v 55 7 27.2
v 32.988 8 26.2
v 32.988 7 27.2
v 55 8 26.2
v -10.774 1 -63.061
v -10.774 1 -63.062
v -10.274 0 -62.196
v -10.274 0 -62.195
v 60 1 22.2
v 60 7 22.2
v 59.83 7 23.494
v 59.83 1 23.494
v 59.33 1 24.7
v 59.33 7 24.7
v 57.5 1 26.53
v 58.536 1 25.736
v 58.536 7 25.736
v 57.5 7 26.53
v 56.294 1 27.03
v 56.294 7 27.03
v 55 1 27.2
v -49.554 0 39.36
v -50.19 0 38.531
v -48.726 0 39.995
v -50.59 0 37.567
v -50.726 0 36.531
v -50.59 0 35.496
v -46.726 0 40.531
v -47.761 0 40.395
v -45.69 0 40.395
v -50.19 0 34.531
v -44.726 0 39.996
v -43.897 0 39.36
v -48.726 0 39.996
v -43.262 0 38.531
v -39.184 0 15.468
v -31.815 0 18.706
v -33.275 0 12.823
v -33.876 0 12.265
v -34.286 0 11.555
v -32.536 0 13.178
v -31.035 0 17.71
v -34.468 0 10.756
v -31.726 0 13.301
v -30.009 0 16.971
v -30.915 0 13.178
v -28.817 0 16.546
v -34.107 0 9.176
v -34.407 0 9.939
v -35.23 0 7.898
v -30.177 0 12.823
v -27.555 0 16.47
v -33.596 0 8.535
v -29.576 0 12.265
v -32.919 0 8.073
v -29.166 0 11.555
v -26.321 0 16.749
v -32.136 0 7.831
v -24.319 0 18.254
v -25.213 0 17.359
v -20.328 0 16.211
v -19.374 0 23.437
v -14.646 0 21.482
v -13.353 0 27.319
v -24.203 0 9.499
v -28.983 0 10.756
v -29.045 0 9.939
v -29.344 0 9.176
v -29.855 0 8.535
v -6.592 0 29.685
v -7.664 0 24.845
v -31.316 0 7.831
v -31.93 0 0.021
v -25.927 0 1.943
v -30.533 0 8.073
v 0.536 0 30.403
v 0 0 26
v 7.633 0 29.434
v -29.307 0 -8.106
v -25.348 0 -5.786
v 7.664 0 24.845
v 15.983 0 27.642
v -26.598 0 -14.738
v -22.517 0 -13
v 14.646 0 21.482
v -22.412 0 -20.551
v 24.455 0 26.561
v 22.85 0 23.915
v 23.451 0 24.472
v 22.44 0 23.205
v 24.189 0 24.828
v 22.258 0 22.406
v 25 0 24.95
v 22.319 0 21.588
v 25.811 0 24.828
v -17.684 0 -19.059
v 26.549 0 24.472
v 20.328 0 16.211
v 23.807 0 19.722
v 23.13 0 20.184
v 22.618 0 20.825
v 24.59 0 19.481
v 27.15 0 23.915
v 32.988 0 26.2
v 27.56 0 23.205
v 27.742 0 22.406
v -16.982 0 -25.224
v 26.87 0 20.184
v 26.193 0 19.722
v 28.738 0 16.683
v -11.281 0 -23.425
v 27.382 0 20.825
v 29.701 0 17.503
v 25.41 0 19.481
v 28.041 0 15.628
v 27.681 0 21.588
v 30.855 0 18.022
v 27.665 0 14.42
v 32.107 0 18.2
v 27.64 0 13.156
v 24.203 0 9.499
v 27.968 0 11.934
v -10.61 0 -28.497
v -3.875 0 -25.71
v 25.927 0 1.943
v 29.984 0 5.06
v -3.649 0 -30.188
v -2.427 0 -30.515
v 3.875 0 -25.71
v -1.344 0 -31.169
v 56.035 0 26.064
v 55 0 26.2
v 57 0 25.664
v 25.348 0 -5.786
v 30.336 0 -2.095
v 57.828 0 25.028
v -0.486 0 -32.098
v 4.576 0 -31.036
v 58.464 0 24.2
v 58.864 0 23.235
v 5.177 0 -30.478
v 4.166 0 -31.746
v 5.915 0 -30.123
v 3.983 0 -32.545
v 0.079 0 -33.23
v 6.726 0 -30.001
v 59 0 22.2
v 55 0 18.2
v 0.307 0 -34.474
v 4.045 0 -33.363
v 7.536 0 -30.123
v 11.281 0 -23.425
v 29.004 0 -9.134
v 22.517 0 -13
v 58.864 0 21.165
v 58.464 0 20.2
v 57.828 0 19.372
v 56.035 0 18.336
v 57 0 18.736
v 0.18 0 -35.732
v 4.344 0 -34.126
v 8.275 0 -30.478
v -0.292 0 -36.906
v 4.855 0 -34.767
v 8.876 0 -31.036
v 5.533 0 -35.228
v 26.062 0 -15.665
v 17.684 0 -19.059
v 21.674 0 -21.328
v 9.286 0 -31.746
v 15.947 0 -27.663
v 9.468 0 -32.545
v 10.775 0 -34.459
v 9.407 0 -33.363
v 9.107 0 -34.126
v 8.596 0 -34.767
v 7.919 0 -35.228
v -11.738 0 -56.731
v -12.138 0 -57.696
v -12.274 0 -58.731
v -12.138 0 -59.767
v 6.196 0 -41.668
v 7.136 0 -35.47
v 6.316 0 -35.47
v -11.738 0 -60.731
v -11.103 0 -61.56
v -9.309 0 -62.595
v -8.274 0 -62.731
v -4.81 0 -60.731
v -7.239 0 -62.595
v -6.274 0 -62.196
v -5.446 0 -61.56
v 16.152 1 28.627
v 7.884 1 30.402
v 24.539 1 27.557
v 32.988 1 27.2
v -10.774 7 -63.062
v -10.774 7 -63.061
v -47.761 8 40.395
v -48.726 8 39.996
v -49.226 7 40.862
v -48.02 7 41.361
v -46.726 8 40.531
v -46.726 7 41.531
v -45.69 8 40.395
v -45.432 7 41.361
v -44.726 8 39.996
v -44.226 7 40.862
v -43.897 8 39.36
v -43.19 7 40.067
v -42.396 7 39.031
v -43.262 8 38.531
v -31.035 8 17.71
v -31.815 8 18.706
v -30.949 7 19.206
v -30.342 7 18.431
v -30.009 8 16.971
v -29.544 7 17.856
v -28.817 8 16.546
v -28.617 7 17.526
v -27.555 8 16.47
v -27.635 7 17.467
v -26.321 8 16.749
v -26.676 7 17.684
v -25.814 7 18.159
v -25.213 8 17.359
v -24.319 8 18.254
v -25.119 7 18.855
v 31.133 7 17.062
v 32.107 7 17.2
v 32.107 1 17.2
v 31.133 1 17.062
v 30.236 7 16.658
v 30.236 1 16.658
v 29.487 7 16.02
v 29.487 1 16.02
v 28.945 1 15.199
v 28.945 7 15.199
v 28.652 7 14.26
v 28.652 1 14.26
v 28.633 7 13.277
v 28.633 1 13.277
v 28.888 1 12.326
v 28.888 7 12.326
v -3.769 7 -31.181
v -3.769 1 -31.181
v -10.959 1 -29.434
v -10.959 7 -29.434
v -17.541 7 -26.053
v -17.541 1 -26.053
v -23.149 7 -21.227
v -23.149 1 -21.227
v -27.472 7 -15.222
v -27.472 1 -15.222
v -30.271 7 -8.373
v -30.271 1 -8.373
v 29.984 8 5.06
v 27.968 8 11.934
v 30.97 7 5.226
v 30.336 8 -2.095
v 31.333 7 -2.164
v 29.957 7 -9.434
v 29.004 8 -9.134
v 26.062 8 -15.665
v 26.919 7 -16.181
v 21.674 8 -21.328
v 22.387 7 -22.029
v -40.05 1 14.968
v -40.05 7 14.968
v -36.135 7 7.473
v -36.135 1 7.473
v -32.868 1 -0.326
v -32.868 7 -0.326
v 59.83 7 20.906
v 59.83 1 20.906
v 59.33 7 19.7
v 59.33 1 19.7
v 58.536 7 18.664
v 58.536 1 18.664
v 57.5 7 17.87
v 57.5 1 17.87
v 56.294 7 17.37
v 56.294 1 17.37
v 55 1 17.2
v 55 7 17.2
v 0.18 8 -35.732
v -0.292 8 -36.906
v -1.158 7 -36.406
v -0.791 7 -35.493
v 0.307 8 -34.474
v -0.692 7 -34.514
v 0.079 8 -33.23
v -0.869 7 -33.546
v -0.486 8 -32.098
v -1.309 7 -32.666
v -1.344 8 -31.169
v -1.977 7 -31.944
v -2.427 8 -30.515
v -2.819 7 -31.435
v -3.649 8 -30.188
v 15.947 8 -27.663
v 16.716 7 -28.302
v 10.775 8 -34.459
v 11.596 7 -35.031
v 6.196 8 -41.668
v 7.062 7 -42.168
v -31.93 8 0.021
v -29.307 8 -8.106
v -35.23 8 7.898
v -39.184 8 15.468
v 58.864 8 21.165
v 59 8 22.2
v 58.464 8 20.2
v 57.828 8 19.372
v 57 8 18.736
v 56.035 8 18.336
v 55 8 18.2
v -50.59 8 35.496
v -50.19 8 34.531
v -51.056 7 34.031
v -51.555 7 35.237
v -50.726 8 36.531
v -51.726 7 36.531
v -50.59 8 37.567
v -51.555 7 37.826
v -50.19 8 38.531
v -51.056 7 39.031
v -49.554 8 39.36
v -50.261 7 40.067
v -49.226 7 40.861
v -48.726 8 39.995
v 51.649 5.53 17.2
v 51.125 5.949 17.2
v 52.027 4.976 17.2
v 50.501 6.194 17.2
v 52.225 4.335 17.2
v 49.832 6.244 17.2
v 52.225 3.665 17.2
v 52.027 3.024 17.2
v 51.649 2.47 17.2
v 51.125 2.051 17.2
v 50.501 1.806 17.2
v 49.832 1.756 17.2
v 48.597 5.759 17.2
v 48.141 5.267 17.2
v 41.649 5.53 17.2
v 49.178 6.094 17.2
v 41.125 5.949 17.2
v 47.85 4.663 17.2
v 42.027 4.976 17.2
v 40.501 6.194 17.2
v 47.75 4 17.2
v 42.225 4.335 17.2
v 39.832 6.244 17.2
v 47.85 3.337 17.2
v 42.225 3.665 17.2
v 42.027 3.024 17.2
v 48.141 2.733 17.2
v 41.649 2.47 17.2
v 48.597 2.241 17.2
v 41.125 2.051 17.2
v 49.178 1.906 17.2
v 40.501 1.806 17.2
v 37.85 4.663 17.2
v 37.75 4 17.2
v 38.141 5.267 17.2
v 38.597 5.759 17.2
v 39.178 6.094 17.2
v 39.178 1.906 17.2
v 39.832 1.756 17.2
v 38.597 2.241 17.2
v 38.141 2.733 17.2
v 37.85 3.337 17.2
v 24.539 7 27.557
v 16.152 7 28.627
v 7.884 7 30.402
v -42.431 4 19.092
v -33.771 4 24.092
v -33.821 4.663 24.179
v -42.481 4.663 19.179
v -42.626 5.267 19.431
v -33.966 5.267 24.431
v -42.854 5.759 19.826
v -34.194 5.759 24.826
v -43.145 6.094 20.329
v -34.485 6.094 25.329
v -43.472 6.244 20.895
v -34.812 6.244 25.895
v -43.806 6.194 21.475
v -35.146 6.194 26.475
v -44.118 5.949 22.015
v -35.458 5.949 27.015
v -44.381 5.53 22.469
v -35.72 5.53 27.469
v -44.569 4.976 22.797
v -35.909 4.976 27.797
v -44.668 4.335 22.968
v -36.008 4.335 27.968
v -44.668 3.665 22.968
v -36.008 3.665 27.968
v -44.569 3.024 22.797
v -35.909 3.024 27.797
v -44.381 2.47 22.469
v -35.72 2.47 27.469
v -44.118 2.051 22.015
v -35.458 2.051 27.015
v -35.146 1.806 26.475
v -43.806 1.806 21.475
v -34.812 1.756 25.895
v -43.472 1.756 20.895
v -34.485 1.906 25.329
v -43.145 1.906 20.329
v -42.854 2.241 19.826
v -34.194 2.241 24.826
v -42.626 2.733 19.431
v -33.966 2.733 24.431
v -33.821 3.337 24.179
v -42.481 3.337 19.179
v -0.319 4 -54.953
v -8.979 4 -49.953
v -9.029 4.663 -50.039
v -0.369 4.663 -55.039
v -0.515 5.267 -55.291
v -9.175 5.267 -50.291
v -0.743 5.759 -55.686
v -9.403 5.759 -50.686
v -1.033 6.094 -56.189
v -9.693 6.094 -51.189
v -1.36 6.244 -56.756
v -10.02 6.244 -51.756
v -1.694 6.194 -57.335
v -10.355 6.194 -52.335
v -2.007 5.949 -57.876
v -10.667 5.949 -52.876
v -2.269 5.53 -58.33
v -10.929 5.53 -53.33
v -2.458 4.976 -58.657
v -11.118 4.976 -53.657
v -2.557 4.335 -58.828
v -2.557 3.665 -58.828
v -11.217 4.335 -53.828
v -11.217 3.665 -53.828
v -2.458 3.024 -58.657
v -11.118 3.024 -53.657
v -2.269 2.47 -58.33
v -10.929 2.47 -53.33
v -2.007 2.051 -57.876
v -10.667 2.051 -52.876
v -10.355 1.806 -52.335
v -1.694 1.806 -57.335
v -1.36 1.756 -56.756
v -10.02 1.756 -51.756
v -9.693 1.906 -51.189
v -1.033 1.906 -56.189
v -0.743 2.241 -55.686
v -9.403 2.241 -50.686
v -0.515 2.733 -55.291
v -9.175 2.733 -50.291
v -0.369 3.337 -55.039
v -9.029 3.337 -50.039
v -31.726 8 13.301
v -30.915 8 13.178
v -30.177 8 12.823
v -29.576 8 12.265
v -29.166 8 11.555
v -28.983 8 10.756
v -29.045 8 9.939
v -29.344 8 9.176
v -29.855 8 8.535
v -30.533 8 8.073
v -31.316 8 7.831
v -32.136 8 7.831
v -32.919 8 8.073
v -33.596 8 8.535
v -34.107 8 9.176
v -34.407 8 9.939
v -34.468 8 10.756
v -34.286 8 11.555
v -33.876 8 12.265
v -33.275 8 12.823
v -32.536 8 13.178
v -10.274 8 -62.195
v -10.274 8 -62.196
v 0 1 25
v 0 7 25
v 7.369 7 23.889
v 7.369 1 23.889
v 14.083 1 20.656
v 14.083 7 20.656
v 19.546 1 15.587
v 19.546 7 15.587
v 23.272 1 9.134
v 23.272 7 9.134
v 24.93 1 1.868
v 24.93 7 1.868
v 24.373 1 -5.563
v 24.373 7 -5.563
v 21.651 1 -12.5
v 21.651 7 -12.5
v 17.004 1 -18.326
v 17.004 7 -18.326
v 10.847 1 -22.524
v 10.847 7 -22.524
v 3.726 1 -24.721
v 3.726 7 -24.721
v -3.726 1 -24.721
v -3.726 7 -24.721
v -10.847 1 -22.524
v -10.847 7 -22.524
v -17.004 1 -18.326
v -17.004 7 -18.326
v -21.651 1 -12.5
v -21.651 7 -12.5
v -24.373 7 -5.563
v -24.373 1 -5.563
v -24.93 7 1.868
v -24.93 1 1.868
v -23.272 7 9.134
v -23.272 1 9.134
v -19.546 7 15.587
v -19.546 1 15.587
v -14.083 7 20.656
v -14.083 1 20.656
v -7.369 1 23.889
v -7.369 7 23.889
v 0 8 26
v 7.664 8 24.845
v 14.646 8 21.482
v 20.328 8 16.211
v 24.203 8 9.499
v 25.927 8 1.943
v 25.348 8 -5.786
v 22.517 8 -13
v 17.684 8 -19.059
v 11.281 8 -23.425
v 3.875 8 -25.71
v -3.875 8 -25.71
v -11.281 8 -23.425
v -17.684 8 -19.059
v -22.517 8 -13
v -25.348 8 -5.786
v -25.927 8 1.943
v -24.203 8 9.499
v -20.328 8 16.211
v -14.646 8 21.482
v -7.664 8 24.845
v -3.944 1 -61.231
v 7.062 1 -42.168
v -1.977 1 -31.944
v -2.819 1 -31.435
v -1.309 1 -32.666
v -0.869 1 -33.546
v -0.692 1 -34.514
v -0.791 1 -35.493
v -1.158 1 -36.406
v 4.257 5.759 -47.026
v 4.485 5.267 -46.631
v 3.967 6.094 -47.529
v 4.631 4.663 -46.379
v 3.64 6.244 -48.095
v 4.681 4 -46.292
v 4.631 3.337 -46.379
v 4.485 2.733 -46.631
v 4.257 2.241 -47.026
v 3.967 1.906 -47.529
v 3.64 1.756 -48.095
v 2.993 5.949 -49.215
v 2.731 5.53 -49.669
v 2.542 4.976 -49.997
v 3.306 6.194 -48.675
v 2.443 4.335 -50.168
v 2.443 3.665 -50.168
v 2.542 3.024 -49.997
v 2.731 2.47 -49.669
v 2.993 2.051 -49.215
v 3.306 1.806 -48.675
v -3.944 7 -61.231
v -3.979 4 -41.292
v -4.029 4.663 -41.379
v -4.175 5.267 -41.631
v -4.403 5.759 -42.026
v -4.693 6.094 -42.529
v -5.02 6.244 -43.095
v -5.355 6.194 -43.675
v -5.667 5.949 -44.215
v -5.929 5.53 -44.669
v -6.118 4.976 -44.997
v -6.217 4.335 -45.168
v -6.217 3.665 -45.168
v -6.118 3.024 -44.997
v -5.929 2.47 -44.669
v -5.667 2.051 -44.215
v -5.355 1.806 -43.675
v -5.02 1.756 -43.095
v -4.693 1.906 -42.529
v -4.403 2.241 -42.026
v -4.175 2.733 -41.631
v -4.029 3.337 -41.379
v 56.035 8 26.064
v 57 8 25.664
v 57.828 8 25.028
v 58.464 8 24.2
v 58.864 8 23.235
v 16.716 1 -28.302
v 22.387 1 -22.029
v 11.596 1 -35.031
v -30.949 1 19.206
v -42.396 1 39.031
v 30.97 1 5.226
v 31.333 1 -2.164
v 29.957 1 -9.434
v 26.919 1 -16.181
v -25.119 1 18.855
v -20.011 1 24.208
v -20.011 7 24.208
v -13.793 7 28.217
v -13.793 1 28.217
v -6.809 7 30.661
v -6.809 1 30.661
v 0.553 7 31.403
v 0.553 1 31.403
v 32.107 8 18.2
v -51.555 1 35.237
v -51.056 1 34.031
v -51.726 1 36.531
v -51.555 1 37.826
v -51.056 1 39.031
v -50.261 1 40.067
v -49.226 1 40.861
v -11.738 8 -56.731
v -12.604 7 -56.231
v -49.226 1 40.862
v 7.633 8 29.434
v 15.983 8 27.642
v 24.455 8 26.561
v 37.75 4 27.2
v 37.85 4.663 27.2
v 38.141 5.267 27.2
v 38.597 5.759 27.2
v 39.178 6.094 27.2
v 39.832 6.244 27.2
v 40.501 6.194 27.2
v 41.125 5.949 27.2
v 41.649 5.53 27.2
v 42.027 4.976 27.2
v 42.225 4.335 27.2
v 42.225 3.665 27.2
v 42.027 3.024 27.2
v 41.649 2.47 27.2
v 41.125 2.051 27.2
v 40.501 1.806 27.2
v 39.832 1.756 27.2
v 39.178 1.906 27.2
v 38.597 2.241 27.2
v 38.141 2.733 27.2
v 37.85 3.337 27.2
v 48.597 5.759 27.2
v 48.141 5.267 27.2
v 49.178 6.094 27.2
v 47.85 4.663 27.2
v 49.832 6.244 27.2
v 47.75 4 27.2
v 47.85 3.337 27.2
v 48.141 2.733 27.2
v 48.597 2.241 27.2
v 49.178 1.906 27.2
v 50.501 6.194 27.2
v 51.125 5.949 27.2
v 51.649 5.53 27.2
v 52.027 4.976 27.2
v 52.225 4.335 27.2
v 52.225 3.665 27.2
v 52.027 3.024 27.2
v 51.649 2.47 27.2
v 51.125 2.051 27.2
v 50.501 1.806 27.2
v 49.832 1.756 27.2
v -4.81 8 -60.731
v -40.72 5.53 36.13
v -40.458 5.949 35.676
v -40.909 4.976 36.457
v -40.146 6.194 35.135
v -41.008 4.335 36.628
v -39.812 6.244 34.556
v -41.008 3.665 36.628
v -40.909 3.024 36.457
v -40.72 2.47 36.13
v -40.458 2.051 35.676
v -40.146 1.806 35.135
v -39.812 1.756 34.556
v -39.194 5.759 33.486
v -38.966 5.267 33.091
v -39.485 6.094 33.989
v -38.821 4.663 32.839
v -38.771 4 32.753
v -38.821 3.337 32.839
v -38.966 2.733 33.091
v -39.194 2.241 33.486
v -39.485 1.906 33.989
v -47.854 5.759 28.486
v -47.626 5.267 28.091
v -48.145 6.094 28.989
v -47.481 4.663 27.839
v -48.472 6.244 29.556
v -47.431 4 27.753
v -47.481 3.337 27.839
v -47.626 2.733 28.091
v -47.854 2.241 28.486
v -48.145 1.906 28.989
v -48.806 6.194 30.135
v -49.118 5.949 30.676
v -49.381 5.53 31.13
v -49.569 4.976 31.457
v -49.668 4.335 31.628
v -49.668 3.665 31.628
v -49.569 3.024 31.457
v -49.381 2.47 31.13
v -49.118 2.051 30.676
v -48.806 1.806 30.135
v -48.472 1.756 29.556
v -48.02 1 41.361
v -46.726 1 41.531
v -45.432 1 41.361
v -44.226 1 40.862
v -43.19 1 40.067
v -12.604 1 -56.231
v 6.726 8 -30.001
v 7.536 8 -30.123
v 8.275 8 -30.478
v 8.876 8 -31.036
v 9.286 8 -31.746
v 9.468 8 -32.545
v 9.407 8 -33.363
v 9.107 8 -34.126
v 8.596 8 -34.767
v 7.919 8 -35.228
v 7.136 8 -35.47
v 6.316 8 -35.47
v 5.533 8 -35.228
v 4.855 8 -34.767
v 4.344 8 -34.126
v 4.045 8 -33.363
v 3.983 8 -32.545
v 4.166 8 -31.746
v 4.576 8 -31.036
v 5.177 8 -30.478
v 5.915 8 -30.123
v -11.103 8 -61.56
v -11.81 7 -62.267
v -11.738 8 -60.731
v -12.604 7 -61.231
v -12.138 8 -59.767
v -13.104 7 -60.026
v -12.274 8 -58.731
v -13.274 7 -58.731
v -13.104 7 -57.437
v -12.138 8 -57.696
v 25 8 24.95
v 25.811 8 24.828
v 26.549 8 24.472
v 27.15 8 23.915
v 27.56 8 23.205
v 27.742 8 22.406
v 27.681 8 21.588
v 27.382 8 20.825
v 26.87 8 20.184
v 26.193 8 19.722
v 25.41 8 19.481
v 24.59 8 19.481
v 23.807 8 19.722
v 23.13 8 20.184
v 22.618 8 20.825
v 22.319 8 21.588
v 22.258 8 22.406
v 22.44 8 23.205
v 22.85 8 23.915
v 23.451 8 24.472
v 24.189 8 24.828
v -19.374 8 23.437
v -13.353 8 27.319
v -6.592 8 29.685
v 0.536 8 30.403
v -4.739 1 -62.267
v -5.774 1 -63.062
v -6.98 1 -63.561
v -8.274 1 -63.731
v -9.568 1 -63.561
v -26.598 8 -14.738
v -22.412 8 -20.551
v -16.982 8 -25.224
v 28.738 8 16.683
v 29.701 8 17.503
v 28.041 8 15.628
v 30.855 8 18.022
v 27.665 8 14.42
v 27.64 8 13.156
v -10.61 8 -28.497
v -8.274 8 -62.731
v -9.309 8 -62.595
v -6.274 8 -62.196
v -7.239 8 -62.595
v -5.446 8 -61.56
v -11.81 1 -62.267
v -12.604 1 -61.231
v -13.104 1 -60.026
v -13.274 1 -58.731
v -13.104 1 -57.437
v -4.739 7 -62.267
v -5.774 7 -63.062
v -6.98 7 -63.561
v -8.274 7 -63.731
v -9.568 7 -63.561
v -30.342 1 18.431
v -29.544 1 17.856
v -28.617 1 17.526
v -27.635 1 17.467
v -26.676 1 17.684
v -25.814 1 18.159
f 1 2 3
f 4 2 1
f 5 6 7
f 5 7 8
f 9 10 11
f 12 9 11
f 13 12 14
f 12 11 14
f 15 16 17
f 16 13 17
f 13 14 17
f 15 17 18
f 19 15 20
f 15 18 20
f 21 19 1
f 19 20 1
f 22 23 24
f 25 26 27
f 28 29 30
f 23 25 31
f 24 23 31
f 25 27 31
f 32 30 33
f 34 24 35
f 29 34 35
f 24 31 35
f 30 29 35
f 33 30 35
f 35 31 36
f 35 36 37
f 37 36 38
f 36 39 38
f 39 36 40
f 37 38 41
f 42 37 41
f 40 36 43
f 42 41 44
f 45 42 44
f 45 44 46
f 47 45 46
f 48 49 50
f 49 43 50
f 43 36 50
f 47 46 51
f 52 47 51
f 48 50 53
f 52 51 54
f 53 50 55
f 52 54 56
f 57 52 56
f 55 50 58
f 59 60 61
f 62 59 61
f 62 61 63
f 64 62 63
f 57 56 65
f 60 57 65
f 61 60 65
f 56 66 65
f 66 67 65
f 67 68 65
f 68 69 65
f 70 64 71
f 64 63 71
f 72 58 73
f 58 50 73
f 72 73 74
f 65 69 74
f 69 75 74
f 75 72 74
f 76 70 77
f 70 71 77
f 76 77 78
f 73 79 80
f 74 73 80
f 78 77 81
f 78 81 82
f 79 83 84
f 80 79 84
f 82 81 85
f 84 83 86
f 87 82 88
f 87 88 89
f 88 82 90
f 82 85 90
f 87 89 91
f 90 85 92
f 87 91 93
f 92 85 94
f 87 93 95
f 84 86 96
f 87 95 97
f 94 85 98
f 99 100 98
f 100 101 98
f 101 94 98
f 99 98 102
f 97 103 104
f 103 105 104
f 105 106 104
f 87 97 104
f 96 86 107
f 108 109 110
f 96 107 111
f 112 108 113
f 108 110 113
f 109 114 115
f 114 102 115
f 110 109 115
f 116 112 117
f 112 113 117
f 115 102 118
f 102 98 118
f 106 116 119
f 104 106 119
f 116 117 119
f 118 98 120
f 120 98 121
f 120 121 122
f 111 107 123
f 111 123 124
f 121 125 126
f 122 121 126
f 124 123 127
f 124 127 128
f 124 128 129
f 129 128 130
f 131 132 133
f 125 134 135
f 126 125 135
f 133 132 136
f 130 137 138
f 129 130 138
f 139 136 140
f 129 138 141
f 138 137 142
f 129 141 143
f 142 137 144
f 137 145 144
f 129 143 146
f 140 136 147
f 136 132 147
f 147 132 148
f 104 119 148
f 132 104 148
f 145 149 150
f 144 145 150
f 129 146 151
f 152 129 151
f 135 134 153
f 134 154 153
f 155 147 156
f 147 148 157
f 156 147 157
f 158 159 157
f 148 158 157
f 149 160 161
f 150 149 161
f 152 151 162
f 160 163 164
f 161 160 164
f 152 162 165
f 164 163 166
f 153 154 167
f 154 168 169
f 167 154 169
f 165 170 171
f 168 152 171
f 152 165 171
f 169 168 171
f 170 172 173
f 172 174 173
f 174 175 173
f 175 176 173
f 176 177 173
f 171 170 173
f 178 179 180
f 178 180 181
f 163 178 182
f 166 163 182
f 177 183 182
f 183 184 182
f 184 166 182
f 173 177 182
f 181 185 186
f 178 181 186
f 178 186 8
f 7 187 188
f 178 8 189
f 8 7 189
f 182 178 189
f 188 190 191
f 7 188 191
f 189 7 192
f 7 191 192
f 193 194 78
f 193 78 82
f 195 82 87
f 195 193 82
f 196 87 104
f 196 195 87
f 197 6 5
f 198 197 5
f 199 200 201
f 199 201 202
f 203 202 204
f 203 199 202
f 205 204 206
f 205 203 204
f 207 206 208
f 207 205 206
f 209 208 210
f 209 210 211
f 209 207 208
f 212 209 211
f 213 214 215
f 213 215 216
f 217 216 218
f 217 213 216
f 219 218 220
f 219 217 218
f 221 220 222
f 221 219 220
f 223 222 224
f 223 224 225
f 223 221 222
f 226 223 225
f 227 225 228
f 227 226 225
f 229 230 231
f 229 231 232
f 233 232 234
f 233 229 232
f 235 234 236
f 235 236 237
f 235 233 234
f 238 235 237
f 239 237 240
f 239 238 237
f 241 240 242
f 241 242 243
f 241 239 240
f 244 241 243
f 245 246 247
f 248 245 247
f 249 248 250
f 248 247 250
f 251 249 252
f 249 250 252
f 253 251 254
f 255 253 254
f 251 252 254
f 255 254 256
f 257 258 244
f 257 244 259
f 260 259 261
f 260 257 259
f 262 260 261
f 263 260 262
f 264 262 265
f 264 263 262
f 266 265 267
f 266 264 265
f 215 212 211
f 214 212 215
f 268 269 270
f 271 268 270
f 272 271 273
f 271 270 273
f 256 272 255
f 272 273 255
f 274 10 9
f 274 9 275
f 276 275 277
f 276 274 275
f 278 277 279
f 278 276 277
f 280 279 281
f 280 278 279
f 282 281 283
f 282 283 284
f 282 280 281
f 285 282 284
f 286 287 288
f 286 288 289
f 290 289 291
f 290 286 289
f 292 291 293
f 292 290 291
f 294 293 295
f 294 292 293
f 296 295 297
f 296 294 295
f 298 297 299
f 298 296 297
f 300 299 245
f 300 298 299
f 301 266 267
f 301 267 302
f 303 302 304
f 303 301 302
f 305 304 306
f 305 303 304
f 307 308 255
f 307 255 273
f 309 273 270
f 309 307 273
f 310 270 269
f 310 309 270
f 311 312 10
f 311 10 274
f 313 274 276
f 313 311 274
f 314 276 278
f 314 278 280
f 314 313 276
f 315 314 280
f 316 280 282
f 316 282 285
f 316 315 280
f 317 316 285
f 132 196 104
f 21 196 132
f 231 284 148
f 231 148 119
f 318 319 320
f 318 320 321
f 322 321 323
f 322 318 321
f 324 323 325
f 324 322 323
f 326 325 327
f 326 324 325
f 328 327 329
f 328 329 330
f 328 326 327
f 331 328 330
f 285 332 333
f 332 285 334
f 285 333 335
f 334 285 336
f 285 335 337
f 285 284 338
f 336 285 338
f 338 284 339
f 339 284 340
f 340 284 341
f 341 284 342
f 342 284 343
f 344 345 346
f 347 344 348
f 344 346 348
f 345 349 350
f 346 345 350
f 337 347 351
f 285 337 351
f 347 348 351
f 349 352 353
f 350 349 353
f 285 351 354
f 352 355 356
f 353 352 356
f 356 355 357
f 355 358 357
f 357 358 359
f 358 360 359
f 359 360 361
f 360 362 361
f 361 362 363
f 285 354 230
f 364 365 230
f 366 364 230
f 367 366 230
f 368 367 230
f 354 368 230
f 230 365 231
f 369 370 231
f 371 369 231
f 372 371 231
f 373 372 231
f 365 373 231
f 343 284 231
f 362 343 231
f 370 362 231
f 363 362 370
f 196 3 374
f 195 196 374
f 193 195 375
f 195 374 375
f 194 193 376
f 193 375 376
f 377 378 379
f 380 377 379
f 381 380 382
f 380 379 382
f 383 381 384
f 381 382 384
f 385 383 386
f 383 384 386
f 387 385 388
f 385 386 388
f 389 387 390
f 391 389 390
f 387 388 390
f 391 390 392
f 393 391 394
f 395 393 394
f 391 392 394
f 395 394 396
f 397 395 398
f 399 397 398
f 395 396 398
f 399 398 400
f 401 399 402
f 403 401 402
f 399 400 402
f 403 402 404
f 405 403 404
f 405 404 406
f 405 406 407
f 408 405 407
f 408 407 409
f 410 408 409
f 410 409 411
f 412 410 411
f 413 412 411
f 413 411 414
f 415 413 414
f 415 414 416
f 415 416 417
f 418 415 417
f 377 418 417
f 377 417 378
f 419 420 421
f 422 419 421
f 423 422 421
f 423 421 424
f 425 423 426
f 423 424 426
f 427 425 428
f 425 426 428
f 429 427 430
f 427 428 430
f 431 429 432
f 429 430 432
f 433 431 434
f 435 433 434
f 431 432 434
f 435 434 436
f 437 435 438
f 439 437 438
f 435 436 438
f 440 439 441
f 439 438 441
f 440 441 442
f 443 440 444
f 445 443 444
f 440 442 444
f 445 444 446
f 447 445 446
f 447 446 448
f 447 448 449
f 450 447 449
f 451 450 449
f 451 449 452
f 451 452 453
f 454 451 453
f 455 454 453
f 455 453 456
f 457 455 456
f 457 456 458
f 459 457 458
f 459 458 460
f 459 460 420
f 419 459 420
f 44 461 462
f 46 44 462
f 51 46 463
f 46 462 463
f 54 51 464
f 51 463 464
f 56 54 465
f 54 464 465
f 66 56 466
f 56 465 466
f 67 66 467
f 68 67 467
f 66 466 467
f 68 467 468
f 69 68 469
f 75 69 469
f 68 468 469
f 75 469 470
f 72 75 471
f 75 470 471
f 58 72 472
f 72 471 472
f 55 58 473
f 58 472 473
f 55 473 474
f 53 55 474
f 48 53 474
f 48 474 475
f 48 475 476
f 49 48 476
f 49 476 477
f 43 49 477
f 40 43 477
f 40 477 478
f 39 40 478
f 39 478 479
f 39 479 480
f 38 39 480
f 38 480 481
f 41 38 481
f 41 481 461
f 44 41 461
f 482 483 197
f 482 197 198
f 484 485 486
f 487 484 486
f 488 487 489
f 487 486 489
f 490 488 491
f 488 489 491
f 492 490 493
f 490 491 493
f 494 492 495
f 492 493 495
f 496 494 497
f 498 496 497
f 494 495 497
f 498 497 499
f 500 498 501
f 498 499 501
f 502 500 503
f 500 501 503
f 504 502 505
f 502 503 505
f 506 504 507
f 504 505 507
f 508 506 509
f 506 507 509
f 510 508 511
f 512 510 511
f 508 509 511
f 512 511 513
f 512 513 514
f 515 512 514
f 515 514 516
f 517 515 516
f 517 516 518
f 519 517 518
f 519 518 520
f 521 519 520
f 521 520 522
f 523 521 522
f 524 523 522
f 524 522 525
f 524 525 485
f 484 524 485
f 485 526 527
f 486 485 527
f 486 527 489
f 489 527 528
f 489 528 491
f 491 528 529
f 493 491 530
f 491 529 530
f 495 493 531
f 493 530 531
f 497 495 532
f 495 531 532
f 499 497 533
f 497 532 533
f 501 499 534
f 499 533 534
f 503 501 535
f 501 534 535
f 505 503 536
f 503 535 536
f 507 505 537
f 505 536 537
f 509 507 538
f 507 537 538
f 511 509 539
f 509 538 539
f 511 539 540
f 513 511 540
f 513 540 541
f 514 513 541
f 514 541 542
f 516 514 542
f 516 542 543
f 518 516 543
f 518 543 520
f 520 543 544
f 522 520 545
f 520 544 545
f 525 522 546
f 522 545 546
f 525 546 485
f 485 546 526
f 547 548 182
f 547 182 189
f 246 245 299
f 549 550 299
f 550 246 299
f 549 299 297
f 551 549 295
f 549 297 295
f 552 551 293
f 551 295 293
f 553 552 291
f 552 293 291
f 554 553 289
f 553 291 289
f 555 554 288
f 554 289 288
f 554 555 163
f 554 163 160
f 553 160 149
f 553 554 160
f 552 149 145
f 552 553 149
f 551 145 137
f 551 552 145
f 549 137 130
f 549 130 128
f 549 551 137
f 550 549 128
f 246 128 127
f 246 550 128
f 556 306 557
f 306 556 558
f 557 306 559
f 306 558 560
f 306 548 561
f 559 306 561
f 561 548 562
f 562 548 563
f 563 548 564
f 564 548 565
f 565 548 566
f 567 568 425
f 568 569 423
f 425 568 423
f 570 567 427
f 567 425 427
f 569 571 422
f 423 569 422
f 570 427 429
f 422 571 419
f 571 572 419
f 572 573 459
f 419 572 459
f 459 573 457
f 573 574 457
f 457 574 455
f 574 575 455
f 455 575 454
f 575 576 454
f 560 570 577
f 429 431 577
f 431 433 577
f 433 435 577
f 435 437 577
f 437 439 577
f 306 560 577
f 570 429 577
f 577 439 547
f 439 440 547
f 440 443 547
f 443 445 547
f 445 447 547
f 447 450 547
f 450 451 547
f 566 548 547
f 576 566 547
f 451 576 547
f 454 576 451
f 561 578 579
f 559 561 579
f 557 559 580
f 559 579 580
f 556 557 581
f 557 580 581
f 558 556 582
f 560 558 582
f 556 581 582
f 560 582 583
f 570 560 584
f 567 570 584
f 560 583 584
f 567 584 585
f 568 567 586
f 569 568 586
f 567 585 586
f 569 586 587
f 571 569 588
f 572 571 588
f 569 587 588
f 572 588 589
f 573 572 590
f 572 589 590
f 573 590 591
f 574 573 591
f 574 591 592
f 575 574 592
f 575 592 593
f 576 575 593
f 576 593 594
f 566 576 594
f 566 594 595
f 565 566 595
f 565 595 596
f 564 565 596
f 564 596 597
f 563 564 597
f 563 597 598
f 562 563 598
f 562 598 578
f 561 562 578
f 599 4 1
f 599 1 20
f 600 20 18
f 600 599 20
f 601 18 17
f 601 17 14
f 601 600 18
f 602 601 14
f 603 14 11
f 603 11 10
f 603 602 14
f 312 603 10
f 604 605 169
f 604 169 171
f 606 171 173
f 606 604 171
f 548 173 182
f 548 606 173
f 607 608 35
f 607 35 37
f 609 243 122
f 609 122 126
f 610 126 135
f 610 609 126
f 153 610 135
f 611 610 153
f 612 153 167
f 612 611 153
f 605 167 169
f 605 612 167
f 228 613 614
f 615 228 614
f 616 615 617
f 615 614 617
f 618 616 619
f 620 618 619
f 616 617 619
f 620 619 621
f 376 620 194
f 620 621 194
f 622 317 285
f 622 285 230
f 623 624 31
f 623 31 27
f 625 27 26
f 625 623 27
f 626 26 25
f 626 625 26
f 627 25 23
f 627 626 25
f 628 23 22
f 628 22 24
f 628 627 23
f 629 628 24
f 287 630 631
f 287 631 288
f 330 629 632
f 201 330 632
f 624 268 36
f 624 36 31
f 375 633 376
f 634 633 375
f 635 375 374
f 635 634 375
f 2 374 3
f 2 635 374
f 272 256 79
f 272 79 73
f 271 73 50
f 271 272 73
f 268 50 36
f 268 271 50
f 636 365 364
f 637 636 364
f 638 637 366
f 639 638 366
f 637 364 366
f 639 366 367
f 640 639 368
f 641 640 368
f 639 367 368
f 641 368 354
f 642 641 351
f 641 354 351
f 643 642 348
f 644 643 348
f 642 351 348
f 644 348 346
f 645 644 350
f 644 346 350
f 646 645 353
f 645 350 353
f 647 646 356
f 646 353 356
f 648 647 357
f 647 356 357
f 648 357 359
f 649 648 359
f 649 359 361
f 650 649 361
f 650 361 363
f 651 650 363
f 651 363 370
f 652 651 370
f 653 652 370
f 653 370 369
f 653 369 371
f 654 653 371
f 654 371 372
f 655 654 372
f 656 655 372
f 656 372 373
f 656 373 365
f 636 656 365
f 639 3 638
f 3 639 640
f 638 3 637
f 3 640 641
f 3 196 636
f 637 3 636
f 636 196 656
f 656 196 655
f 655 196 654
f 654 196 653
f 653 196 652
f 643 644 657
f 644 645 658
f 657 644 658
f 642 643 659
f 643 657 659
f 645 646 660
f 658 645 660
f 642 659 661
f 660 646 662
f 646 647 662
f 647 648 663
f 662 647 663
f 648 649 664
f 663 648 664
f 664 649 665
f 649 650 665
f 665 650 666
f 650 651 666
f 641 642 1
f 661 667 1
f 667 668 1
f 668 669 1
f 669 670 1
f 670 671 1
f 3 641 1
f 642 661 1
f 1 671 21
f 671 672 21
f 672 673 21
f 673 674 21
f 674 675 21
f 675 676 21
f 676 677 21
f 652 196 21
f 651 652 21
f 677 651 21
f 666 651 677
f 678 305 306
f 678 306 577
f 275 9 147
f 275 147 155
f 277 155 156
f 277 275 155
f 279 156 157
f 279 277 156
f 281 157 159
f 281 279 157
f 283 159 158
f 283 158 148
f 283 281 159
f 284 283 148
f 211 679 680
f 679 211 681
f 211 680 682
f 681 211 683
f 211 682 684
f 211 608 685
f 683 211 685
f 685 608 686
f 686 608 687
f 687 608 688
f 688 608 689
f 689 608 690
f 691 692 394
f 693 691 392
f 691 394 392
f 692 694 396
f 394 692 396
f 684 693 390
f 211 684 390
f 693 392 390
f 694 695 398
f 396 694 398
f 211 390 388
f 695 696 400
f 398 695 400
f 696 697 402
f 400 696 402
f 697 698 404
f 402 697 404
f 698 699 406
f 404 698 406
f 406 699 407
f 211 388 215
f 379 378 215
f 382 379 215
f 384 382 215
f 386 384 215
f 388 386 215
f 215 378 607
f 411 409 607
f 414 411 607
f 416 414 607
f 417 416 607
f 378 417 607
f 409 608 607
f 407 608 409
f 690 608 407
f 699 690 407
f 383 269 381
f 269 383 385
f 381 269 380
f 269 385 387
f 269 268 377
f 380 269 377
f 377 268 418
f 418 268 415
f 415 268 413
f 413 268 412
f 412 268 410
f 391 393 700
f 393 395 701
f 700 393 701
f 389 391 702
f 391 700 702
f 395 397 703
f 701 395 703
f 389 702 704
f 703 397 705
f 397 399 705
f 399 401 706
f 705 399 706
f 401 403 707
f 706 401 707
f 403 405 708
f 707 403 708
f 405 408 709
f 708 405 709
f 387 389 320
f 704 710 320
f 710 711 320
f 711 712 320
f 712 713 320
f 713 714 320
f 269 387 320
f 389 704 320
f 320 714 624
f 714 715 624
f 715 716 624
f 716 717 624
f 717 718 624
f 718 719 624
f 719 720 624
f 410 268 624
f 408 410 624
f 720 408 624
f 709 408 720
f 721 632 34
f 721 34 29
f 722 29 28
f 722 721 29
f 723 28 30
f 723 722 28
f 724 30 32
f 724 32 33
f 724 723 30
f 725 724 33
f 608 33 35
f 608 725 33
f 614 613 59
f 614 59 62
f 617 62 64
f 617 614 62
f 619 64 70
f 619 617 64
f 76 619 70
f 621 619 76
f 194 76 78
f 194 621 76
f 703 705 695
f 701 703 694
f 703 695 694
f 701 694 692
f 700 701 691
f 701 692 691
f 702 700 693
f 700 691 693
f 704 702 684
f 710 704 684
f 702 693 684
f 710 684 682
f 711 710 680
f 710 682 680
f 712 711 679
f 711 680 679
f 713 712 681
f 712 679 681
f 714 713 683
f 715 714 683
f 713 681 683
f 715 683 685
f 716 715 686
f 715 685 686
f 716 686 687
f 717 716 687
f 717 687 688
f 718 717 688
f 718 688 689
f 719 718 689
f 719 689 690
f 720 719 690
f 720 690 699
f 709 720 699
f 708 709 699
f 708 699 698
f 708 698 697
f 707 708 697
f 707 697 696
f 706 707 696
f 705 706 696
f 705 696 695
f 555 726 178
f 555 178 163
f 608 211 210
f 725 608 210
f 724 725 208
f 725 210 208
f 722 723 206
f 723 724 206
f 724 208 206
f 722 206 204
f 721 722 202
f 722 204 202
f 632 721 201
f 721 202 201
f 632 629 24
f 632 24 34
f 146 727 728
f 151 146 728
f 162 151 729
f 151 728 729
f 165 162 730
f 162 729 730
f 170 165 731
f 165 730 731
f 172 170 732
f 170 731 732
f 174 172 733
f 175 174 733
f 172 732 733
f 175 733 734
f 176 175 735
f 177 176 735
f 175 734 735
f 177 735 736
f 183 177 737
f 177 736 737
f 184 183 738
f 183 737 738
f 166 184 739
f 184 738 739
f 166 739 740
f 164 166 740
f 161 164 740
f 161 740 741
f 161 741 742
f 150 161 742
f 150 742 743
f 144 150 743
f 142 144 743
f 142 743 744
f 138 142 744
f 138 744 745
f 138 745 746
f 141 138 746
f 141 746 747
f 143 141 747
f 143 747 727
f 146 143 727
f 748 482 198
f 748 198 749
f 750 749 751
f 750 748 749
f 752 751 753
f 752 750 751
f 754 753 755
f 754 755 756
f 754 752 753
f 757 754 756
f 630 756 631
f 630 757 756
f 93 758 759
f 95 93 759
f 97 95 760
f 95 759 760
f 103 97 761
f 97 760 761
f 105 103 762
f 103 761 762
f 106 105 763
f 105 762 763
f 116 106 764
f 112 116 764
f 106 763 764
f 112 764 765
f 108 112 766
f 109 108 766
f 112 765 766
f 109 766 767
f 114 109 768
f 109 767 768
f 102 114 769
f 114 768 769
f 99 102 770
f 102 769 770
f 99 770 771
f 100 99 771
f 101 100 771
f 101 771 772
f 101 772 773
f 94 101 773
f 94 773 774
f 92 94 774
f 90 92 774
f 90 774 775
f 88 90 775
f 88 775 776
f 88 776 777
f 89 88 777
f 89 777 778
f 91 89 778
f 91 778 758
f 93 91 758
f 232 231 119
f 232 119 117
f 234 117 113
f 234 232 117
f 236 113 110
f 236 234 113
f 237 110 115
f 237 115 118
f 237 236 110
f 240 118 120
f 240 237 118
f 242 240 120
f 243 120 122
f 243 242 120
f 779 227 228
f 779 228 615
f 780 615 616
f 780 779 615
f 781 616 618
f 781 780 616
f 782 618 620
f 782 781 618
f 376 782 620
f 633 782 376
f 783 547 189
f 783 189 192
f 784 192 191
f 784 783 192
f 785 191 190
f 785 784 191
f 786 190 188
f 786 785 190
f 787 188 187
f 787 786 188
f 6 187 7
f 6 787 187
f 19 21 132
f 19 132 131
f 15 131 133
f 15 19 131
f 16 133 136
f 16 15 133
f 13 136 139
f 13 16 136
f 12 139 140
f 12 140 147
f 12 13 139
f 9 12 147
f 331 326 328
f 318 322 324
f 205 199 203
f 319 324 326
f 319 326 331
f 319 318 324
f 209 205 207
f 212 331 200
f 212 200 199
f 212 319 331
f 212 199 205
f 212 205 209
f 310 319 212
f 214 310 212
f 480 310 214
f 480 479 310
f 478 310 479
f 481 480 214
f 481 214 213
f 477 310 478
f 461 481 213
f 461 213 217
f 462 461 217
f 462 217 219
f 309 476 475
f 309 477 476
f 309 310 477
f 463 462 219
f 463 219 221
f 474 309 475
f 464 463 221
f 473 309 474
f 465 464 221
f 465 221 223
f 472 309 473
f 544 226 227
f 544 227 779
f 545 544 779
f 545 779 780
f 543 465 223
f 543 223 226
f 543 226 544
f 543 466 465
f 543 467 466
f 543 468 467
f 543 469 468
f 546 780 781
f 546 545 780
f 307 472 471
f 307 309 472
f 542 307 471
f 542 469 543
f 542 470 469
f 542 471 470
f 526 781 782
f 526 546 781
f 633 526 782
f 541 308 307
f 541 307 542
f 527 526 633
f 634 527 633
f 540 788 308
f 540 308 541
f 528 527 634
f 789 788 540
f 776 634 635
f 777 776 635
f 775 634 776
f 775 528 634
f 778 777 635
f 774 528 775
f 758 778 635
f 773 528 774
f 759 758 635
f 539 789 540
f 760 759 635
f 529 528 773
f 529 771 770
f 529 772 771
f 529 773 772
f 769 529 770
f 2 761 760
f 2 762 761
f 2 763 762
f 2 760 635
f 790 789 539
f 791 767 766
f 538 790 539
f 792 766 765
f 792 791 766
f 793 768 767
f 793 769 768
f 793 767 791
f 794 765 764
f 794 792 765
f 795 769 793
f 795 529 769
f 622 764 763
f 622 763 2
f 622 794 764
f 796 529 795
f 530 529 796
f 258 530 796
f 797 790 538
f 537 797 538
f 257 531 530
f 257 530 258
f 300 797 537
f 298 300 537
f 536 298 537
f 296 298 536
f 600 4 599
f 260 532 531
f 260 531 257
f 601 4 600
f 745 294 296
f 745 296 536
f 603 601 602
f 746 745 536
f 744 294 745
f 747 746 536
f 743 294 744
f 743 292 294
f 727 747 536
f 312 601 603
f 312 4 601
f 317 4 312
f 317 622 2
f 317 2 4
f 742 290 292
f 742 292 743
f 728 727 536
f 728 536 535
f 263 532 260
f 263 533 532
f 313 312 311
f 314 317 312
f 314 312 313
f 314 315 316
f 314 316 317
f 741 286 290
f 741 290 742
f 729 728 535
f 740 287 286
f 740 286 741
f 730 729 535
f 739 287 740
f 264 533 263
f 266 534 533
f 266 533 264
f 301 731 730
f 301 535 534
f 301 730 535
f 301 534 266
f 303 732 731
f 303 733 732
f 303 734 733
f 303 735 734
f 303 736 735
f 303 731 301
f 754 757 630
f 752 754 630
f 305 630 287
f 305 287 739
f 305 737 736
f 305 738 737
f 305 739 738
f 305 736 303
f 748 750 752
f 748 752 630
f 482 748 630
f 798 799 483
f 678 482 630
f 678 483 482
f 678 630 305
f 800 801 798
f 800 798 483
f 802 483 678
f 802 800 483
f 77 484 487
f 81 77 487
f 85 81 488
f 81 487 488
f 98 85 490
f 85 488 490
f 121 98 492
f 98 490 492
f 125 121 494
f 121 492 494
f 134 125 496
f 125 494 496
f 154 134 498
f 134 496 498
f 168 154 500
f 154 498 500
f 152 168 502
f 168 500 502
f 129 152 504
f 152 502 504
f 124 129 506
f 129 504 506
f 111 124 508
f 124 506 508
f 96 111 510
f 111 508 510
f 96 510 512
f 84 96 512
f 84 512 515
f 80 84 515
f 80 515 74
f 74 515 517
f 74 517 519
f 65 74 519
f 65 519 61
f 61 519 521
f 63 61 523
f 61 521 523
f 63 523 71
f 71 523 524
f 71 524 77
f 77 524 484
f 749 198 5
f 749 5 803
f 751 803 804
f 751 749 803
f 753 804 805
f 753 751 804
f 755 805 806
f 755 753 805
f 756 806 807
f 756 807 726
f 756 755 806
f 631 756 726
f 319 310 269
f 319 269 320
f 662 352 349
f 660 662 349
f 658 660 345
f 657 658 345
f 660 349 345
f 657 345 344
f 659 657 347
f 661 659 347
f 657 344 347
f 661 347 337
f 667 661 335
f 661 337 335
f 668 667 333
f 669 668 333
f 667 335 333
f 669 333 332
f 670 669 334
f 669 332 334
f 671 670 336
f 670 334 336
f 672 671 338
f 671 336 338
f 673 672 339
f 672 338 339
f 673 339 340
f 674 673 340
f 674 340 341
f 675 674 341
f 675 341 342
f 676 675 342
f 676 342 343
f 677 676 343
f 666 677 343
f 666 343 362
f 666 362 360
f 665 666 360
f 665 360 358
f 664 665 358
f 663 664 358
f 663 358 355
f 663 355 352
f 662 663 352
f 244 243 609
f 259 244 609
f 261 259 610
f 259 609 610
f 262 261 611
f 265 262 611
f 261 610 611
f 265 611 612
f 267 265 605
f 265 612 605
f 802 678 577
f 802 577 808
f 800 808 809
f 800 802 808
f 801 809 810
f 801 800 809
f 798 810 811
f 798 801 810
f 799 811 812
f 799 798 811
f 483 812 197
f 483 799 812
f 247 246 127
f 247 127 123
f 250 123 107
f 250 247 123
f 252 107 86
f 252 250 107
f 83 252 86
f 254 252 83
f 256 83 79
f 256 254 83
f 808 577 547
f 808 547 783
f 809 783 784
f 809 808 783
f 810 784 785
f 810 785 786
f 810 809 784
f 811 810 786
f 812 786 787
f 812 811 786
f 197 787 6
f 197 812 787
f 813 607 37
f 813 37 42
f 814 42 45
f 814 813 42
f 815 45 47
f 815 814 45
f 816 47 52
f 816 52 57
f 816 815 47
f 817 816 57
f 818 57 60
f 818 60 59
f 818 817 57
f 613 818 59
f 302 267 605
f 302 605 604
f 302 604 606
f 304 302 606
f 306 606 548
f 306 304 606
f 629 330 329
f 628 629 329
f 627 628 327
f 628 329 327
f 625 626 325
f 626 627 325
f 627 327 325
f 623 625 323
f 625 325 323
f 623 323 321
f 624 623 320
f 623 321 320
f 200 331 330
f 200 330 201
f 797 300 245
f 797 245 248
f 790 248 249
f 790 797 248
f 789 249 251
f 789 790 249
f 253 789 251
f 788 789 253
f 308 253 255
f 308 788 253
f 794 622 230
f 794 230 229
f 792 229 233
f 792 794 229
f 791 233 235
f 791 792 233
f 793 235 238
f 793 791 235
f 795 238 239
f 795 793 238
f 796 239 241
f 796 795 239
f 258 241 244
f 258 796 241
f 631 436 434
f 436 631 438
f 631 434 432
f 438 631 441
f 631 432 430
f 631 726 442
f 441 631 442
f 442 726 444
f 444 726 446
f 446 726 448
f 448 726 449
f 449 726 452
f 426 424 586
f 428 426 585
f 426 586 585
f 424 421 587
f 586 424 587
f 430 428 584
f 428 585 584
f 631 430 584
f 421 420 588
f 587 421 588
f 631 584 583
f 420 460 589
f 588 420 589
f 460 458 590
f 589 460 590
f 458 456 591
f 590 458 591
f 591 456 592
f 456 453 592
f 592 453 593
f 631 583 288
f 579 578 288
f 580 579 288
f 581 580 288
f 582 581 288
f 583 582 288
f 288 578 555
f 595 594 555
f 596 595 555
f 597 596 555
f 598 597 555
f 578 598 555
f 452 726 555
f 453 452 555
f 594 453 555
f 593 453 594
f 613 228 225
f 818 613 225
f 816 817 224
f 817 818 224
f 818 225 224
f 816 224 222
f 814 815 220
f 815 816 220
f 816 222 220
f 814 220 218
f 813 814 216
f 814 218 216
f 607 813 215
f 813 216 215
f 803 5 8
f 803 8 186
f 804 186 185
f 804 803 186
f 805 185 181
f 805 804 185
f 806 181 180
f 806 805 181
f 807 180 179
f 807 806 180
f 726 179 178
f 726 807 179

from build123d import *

# Parameters (mm, degrees)
BOSS_EXTRUDE1_DEPTH = 8
SKETCH2_R           = 2.25
CUT_EXTRUDE1_DEPTH  = 103.535212939
SKETCH4_R           = 25
SKETCH4_R_2         = 2.75
CUT_EXTRUDE2_DEPTH  = 90.231796233
FILLET1_R           = 5
FILLET2_R           = 100
FILLET3_R           = 3.5
SKETCH5_R           = 2.25
CUT_EXTRUDE3_DEPTH  = 94.342548859
SKETCH6_R           = 2.25
CUT_EXTRUDE4_DEPTH  = 87.844060995
CHAMFER1_SIZE       = 1


with BuildPart() as part:
    # Sketch1 → Boss-Extrude1 (new body)
    with BuildSketch(Plane(origin=(0, 0, 0), x_dir=(1, 0, 0), z_dir=(0, 1, 0))):
        with BuildLine():
            Line((60, -27.2), (60, -17.2))
            Line((60, -17.2), (26.27952308, -17.2))
            ThreePointArc((26.27952308, -17.2), (30.553109939, 7.277417565), (15.703927322, 27.2))
            Line((15.703927322, 27.2), (-6.444109017, 65.561524227))
            Line((-6.444109017, 65.561524227), (-15.104363055, 60.561524227))
            Line((-15.104363055, 60.561524227), (1.755875405, 31.358734587))
            ThreePointArc((1.755875405, 31.358734587), (-21.578983454, 22.821060589), (-31.407854644, 0))
            Line((-31.407854644, 0), (-53.555890983, -38.361524227))
            Line((-53.555890983, -38.361524227), (-44.895636945, -43.361524227))
            Line((-44.895636945, -43.361524227), (-28.035398485, -14.158734587))
            ThreePointArc((-28.035398485, -14.158734587), (-8.974126484, -30.098478154), (15.703927322, -27.2))
            Line((15.703927322, -27.2), (60, -27.2))
        make_face()
    extrude(amount=BOSS_EXTRUDE1_DEPTH)

    # Sketch2 → Cut-Extrude1 (cut, through all)
    with BuildSketch(Plane(origin=(0, 0, 17.2), x_dir=(-1, 0, 0), z_dir=(0, 0, -1))):
        with Locations((-50, 4)):
            Circle(SKETCH2_R)
        with Locations((-40, 4)):
            Circle(SKETCH2_R)
    extrude(amount=-CUT_EXTRUDE1_DEPTH, mode=Mode.SUBTRACT)

    # Sketch4 → Cut-Extrude2 (cut, through all)
    with BuildSketch(Plane(origin=(0, 8, 0), x_dir=(1, 0, 0), z_dir=(0, 1, 0))):
        with Locations(Location((0, 0, 0), (0, 0, 270))):
            Circle(SKETCH4_R)
        with Locations(Location((25, -22.2, 0), (0, 0, 270))):
            Circle(SKETCH4_R_2)
        with Locations(Location((-31.725763964, -10.550635095, 0), (0, 0, 270))):
            Circle(SKETCH4_R_2)
        with Locations(Location((6.725763964, 32.750635095, 0), (0, 0, 270))):
            Circle(SKETCH4_R_2)
    extrude(amount=-CUT_EXTRUDE2_DEPTH, mode=Mode.SUBTRACT)

    # Fillet1
    fillet1_edges = [part.edges().sort_by_distance(p)[0] for p in [
        (-6.444109017, 4, -65.561524227),
        (-15.104363055, 4, -60.561524227),
        (-53.555890983, 4, 38.361524227),
        (-44.895636945, 4, 43.361524227),
        (60, 4, 17.2),
        (60, 4, 27.2),
    ]]
    fillet(fillet1_edges, radius=FILLET1_R - 0.0001)  # a hair under: the kernel refuses the full size

    # Fillet2
    fillet2_edges = [part.edges().sort_by_distance(p)[0] for p in [
        (15.703927322, 4, 27.2),
        (-31.407854644, 4, 0),
        (15.703927322, 4, -27.2),
    ]]
    fillet(fillet2_edges, radius=FILLET2_R)

    # Fillet3
    fillet3_edges = [part.edges().sort_by_distance(p)[0] for p in [
        (26.27952308, 4, 17.2),
        (-28.035398485, 4, 14.158734587),
        (1.755875405, 4, -31.358734587),
    ]]
    fillet(fillet3_edges, radius=FILLET3_R)

    # Sketch5 → Cut-Extrude3 (cut, through all)
    with BuildSketch(Plane(origin=(-14.895636945, 0, -8.6), x_dir=(0.49999999999999967, 0, -0.8660254037844388), z_dir=(0.8660254037844388, 0, 0.49999999999999967))):
        with Locations((-50, 4)):
            Circle(SKETCH5_R)
        with Locations((-40, 4)):
            Circle(SKETCH5_R)
    extrude(amount=-CUT_EXTRUDE3_DEPTH, mode=Mode.SUBTRACT)

    # Sketch6 → Cut-Extrude4 (cut, through all)
    with BuildSketch(Plane(origin=(14.895636945, 0, -8.6), x_dir=(0.5000000000000007, 0, 0.8660254037844384), z_dir=(-0.8660254037844383, 0, 0.5000000000000006))):
        with Locations((-50, 4)):
            Circle(SKETCH6_R)
        with Locations((-40, 4)):
            Circle(SKETCH6_R)
    extrude(amount=-CUT_EXTRUDE4_DEPTH, mode=Mode.SUBTRACT)

    # Chamfer1
    chamfer1_edges = [part.edges().sort_by_distance(p)[0] for p in [
        (14.084814681, 0, -31.611912354),
        (14.084814681, 8, -31.611912354),
        (-34.419126501, 0, 3.608148855),
        (-34.419126501, 8, 3.608148855),
        (20.33431182, 0, 28.003763498),
        (20.33431182, 8, 28.003763498),
        (-20.487421356, 0, -23.805858513),
        (-20.487421356, 8, -23.805858513),
        (-10.372767553, 0, 29.645556608),
        (-10.372767553, 8, 29.645556608),
        (30.860188909, 0, -5.839698096),
        (30.860188909, 8, -5.839698096),
        (-1.058220823, 0, -33.090959821),
        (-1.058220823, 8, -33.090959821),
        (-28.128501429, 0, 17.461926027),
        (-28.128501429, 8, 17.461926027),
        (29.186722253, 0, 15.629033795),
        (29.186722253, 8, 15.629033795),
        (0, 0, -25),
        (0, 8, -25),
        (1.558956478, 0, -51.699808173),
        (43.553619041, 0, 17.2),
        (43.99386901, 0, 27.2),
        (-36.672446466, 0, 29.118540516),
        (-45.552825488, 0, 24.499808173),
        (-6.881172576, 0, -46.318540516),
        (58.535563195, 0, 25.735563195),
        (58.535563195, 0, 18.664436805),
        (-45.431658018, 0, 41.36106635),
        (-51.555433105, 0, 37.825503154),
        (-13.103905177, 0, -60.025503154),
        (-6.98013009, 0, -63.56106635),
        (1.558956478, 8, -51.699808173),
        (-6.881172576, 8, -46.318540516),
        (-45.552825488, 8, 24.499808173),
        (-36.672446466, 8, 29.118540516),
        (43.99386901, 8, 27.2),
        (43.553619041, 8, 17.2),
        (58.535563195, 8, 25.735563195),
        (58.535563195, 8, 18.664436805),
        (-45.431658018, 8, 41.36106635),
        (-51.555433105, 8, 37.825503154),
        (-13.103905177, 8, -60.025503154),
        (-6.98013009, 8, -63.56106635),
    ]]
    chamfer(chamfer1_edges, length=CHAMFER1_SIZE)


solid = part.part
